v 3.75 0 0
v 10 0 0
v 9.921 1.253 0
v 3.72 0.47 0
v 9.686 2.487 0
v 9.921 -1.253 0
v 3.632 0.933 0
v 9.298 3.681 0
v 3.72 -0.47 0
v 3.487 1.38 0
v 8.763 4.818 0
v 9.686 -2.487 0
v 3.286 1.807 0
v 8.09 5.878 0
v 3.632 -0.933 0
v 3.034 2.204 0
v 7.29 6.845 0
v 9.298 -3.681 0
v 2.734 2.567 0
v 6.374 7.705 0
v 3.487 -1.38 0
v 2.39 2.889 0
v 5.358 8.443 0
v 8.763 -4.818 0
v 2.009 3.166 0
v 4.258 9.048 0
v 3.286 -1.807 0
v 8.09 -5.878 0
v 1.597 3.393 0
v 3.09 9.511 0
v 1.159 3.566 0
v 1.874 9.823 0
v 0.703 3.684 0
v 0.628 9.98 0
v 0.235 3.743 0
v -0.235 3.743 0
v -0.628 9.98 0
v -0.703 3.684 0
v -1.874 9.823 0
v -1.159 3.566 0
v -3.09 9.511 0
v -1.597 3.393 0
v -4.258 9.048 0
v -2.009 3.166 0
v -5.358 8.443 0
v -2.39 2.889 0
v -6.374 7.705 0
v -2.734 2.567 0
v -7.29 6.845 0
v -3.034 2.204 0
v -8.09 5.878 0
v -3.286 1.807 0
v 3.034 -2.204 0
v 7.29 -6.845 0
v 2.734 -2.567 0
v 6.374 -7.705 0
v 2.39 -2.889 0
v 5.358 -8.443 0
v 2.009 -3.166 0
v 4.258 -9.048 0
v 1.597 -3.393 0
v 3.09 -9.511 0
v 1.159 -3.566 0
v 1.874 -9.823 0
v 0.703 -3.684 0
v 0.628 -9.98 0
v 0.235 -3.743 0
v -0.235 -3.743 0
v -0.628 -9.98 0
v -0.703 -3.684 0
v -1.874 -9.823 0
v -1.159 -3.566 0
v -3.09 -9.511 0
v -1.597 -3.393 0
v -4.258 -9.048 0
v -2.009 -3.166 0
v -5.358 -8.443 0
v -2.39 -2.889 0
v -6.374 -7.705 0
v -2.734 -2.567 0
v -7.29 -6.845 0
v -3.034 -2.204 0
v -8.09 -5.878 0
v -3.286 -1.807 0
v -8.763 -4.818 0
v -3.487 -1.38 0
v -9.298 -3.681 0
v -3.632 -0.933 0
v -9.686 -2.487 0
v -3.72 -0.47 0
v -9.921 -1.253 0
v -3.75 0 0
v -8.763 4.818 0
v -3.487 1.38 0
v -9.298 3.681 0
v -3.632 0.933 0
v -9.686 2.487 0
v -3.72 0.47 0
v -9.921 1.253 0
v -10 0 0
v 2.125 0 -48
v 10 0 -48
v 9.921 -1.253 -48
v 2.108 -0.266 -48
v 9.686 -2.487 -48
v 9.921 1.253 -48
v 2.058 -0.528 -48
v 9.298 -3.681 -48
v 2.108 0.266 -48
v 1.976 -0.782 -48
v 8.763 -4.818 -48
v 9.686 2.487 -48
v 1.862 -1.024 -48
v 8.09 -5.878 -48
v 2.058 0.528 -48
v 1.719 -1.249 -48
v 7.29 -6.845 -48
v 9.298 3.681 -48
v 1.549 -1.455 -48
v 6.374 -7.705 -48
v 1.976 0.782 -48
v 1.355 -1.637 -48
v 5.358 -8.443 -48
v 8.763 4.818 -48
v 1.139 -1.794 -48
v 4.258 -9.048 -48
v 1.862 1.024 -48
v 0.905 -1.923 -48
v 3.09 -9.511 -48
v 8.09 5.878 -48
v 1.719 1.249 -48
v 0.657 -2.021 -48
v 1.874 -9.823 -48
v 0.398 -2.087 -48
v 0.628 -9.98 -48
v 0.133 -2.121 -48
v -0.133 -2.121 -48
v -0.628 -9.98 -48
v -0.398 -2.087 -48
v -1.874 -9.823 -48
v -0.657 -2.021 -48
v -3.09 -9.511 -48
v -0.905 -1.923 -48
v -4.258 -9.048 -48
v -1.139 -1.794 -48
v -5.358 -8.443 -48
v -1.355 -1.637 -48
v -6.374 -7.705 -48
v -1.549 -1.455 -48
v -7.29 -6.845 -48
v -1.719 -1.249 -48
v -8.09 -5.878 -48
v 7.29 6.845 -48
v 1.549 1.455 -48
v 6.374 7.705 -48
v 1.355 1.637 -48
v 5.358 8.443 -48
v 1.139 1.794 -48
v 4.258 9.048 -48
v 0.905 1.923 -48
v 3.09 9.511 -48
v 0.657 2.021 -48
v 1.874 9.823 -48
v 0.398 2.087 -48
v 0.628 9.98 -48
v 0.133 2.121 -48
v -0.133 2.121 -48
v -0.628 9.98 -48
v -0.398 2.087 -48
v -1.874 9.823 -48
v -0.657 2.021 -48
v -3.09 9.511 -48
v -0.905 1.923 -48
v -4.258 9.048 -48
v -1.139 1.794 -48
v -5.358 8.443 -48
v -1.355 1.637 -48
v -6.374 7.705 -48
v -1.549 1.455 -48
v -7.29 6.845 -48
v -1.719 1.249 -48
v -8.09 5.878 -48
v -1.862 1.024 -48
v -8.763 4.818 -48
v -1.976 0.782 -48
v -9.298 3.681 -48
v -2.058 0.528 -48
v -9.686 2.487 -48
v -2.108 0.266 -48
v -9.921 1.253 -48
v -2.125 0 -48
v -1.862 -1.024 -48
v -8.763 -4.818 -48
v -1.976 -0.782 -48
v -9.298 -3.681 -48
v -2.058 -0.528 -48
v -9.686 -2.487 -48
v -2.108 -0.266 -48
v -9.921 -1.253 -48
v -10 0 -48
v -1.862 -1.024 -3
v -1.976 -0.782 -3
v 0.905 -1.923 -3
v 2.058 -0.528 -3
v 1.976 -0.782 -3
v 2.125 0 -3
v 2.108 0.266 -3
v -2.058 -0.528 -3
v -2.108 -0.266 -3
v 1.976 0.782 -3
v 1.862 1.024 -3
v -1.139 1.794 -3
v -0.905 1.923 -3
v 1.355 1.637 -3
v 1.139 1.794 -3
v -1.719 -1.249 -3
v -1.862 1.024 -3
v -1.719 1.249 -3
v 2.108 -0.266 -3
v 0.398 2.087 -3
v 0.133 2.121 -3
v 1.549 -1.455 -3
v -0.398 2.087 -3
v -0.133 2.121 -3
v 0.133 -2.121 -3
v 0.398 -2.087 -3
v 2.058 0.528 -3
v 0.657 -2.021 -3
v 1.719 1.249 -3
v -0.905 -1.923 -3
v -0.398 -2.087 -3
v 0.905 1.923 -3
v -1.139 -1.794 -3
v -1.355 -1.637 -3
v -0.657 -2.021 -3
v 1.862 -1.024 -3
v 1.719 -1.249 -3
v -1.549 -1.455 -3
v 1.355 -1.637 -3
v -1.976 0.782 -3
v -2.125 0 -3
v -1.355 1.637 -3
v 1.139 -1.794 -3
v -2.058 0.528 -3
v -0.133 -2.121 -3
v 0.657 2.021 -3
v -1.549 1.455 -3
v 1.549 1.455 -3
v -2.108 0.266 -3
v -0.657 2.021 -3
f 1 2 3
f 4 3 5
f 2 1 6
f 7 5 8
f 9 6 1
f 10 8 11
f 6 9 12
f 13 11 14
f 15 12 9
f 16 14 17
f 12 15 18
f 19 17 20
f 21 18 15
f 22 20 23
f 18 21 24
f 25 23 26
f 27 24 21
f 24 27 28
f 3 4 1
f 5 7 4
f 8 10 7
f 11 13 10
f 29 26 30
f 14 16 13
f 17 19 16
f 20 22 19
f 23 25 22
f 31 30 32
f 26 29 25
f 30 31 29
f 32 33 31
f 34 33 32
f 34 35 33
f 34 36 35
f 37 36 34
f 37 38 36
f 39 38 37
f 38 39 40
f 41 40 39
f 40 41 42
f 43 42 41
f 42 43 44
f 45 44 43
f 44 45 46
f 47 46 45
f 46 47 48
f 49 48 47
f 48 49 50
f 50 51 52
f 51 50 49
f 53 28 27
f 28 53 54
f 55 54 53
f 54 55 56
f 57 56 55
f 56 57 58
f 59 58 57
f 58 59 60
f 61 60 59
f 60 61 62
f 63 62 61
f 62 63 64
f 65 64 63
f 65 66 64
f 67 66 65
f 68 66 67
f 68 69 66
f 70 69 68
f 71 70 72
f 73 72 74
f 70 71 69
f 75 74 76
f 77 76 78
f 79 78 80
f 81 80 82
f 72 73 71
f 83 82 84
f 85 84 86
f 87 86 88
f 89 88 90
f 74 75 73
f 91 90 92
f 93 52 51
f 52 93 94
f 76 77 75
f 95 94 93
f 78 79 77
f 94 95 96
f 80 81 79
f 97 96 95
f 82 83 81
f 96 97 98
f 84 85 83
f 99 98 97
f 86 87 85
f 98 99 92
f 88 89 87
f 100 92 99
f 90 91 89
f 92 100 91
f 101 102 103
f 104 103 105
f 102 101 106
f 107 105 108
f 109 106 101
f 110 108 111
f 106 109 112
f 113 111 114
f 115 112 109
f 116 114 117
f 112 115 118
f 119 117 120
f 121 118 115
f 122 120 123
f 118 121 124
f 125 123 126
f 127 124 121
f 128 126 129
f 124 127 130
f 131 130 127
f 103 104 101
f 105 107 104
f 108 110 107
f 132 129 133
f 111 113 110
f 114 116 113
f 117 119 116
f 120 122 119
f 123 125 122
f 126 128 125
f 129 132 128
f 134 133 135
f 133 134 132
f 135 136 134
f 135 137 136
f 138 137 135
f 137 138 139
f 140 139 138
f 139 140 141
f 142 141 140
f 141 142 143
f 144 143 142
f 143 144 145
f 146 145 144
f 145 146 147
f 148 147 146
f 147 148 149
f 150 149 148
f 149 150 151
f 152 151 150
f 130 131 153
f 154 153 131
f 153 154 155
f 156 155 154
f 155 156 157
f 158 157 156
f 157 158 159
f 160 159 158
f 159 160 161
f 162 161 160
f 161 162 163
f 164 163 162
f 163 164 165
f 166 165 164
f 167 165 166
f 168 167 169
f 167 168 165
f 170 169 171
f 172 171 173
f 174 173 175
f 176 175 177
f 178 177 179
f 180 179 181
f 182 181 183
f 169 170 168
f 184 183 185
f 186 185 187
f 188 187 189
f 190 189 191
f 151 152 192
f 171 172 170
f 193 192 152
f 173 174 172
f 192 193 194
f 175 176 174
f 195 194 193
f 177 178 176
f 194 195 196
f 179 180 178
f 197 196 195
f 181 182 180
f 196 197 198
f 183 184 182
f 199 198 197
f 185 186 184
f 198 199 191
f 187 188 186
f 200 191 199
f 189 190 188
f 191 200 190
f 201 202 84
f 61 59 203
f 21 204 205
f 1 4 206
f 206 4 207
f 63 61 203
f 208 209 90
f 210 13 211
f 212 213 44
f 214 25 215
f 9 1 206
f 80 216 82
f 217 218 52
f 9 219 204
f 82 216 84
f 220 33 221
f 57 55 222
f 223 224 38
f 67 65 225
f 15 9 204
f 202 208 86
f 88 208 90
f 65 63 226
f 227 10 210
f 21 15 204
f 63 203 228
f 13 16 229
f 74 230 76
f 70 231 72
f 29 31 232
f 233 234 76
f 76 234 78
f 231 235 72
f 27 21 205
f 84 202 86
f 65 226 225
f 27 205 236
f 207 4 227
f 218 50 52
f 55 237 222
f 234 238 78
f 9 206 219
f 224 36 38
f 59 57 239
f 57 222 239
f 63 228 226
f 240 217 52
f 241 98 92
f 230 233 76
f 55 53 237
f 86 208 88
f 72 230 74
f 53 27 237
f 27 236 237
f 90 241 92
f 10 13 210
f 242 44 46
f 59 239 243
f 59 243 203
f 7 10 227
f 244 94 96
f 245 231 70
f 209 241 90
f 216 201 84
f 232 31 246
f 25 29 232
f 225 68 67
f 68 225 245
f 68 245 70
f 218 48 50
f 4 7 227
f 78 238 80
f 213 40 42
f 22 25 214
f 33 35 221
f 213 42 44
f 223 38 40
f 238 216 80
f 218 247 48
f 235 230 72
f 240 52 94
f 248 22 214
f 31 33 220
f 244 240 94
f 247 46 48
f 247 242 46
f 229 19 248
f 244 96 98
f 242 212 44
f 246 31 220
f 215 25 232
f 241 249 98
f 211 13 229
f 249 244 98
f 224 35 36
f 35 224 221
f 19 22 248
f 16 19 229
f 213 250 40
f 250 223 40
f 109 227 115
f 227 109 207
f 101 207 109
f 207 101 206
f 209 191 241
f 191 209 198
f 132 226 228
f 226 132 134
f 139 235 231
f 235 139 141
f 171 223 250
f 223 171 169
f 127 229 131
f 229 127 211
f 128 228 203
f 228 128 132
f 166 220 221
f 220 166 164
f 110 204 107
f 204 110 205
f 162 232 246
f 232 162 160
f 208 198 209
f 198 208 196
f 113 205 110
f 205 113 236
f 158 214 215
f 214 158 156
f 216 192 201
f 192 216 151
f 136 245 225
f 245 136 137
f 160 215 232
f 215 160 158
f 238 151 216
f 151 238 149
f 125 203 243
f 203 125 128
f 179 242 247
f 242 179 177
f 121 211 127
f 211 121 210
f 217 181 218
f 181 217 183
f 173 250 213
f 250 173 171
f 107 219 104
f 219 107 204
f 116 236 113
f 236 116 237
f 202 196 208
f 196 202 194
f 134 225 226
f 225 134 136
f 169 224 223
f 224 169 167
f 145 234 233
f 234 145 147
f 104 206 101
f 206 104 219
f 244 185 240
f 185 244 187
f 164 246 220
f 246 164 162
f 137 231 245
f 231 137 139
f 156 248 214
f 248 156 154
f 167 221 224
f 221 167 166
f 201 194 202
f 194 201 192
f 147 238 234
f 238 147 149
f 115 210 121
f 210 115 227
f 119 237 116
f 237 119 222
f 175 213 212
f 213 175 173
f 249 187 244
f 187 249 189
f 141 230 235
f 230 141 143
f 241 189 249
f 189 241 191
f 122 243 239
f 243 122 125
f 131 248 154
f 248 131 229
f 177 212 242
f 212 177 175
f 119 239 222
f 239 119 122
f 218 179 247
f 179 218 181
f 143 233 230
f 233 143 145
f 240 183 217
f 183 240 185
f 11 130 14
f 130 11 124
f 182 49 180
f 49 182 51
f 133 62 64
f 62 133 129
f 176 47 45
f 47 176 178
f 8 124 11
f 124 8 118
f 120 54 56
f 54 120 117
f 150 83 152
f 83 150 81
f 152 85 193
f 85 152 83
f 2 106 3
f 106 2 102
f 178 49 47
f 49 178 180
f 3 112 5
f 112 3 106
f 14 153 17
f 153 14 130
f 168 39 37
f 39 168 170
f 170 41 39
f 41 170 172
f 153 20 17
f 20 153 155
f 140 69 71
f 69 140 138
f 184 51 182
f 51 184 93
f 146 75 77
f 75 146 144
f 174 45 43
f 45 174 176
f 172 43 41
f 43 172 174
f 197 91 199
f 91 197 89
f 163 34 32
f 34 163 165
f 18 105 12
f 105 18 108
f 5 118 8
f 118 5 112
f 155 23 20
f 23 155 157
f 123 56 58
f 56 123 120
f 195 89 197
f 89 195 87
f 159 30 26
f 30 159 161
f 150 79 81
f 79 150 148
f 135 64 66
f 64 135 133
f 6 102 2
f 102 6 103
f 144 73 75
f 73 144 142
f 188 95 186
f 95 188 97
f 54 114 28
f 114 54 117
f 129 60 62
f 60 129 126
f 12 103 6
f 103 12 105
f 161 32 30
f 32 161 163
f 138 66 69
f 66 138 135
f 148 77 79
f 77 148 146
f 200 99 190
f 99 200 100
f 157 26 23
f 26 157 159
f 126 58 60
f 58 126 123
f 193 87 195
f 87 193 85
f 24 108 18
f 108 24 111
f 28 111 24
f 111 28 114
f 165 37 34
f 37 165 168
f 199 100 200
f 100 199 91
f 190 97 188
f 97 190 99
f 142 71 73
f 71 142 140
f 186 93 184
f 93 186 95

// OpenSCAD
$fn = 50;


difference() {
	union() {
		translate(v = [0, 0, -48.0000000000]) {
			cylinder(h = 48, r = 10.0000000000);
		}
	}
	union() {
		translate(v = [0, 0, 0]) {
			rotate(a = [0, 0, 0]) {
				difference() {
					union() {
						#translate(v = [0, 0, -48.0000000000]) {
							cylinder(h = 48, r = 2.0000000000);
						}
						#translate(v = [0, 0, -3]) {
							cylinder(h = 3, r = 10.0000000000, r1 = 2.1250000000, r2 = 3.7500000000);
						}
						#translate(v = [0, 0, -48.0000000000]) {
							cylinder(h = 48, r = 2.1250000000);
						}
						#translate(v = [0, 0, -48.0000000000]) {
							cylinder(h = 48, r = 2.0000000000);
						}
					}
					union();
				}
			}
		}
	}
}
